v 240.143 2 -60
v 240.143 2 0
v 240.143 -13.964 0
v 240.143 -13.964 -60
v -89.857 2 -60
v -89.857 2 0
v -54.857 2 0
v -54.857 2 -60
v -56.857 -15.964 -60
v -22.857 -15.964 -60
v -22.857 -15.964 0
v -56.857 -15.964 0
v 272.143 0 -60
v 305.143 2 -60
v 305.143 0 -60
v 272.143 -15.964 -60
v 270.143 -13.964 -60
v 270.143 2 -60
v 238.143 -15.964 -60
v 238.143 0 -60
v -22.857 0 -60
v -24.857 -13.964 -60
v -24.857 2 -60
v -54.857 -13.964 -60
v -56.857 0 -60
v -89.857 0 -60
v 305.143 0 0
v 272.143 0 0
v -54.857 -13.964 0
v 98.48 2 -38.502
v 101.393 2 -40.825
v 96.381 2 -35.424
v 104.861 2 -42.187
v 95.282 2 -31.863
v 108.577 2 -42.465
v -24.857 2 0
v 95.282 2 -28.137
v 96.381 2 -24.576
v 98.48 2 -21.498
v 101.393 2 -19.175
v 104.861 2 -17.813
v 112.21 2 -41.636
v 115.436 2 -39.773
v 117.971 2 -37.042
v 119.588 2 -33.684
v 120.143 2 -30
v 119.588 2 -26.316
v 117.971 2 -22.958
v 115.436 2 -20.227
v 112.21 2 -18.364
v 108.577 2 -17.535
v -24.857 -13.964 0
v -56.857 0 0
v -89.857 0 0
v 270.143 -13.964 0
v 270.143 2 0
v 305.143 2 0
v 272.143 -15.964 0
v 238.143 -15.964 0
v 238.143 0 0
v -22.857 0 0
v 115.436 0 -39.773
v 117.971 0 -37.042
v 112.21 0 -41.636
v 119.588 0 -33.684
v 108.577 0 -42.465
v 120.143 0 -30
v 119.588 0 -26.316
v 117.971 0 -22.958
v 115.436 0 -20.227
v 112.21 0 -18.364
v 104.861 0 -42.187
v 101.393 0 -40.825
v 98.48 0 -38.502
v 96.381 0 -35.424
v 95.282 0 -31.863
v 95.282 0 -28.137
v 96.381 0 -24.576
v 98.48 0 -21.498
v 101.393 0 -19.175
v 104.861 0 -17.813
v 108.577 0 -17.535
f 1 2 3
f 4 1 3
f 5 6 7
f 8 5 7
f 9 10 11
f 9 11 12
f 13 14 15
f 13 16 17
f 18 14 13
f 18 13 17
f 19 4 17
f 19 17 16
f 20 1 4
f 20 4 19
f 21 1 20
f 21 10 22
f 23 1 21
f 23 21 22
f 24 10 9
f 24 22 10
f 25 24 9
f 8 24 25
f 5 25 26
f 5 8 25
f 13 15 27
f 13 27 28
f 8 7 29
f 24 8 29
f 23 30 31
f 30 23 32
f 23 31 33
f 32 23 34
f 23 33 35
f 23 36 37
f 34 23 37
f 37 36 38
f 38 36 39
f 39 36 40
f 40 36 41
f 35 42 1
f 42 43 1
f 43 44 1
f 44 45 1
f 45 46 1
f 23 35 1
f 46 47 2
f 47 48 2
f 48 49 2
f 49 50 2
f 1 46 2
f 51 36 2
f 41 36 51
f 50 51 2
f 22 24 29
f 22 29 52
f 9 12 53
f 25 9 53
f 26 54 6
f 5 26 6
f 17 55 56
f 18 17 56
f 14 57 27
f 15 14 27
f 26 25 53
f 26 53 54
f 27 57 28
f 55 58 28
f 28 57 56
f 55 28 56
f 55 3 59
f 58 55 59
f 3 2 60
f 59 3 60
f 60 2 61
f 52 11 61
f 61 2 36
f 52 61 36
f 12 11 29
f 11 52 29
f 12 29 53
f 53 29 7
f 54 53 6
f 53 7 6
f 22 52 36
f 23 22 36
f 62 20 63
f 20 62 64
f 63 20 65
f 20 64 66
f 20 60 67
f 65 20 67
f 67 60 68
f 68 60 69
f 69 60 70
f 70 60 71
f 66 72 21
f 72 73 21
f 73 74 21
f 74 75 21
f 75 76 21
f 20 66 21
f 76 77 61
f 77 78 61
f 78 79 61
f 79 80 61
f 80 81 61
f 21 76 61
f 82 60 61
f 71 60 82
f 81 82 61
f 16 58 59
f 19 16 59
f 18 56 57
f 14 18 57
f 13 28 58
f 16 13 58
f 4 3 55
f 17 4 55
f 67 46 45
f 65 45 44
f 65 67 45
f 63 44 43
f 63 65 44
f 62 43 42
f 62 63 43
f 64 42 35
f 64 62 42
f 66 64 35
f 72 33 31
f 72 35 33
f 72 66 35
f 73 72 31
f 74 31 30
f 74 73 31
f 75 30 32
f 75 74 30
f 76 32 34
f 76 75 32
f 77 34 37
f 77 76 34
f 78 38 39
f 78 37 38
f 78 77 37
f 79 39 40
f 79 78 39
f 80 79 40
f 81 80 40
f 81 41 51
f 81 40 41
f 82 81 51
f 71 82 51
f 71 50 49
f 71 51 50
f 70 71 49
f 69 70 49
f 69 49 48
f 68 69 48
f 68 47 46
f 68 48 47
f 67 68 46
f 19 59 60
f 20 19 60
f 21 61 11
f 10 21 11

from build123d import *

# Parameters (mm, degrees)
BOSS_EXTRUDE1_DEPTH = 60
SKETCH2_R           = 12.5
CUT_EXTRUDE2_DEPTH  = 60


with BuildPart() as part:
    # Sketch1 → Boss-Extrude1 (new body)
    with BuildSketch(Plane.XY):
        Polygon((305.142857143, 0), (272.142857143, 0), (272.142857143, -15.964285714), (238.142857143, -15.964285714), (238.142857143, 0), (-22.857142857, 0), (-22.857142857, -15.964285714), (-56.857142857, -15.964285714), (-56.857142857, 0), (-89.857142857, 0), (-89.857142857, 2), (-54.857142857, 2), (-54.857142857, -13.964285714), (-24.857142857, -13.964285714), (-24.857142857, 2), (240.142857143, 2), (240.142857143, -13.964285714), (270.142857143, -13.964285714), (270.142857143, 2), (305.142857143, 2), align=None)
    extrude(amount=-BOSS_EXTRUDE1_DEPTH)

    # Sketch2 → Cut-Extrude2 (cut)
    with BuildSketch(Plane(origin=(0, 0, 0), x_dir=(1, 0, 0), z_dir=(0, 1, 0))):
        with Locations((107.642857143, 30)):
            Circle(SKETCH2_R)
    extrude(amount=CUT_EXTRUDE2_DEPTH, mode=Mode.SUBTRACT)


solid = part.part
